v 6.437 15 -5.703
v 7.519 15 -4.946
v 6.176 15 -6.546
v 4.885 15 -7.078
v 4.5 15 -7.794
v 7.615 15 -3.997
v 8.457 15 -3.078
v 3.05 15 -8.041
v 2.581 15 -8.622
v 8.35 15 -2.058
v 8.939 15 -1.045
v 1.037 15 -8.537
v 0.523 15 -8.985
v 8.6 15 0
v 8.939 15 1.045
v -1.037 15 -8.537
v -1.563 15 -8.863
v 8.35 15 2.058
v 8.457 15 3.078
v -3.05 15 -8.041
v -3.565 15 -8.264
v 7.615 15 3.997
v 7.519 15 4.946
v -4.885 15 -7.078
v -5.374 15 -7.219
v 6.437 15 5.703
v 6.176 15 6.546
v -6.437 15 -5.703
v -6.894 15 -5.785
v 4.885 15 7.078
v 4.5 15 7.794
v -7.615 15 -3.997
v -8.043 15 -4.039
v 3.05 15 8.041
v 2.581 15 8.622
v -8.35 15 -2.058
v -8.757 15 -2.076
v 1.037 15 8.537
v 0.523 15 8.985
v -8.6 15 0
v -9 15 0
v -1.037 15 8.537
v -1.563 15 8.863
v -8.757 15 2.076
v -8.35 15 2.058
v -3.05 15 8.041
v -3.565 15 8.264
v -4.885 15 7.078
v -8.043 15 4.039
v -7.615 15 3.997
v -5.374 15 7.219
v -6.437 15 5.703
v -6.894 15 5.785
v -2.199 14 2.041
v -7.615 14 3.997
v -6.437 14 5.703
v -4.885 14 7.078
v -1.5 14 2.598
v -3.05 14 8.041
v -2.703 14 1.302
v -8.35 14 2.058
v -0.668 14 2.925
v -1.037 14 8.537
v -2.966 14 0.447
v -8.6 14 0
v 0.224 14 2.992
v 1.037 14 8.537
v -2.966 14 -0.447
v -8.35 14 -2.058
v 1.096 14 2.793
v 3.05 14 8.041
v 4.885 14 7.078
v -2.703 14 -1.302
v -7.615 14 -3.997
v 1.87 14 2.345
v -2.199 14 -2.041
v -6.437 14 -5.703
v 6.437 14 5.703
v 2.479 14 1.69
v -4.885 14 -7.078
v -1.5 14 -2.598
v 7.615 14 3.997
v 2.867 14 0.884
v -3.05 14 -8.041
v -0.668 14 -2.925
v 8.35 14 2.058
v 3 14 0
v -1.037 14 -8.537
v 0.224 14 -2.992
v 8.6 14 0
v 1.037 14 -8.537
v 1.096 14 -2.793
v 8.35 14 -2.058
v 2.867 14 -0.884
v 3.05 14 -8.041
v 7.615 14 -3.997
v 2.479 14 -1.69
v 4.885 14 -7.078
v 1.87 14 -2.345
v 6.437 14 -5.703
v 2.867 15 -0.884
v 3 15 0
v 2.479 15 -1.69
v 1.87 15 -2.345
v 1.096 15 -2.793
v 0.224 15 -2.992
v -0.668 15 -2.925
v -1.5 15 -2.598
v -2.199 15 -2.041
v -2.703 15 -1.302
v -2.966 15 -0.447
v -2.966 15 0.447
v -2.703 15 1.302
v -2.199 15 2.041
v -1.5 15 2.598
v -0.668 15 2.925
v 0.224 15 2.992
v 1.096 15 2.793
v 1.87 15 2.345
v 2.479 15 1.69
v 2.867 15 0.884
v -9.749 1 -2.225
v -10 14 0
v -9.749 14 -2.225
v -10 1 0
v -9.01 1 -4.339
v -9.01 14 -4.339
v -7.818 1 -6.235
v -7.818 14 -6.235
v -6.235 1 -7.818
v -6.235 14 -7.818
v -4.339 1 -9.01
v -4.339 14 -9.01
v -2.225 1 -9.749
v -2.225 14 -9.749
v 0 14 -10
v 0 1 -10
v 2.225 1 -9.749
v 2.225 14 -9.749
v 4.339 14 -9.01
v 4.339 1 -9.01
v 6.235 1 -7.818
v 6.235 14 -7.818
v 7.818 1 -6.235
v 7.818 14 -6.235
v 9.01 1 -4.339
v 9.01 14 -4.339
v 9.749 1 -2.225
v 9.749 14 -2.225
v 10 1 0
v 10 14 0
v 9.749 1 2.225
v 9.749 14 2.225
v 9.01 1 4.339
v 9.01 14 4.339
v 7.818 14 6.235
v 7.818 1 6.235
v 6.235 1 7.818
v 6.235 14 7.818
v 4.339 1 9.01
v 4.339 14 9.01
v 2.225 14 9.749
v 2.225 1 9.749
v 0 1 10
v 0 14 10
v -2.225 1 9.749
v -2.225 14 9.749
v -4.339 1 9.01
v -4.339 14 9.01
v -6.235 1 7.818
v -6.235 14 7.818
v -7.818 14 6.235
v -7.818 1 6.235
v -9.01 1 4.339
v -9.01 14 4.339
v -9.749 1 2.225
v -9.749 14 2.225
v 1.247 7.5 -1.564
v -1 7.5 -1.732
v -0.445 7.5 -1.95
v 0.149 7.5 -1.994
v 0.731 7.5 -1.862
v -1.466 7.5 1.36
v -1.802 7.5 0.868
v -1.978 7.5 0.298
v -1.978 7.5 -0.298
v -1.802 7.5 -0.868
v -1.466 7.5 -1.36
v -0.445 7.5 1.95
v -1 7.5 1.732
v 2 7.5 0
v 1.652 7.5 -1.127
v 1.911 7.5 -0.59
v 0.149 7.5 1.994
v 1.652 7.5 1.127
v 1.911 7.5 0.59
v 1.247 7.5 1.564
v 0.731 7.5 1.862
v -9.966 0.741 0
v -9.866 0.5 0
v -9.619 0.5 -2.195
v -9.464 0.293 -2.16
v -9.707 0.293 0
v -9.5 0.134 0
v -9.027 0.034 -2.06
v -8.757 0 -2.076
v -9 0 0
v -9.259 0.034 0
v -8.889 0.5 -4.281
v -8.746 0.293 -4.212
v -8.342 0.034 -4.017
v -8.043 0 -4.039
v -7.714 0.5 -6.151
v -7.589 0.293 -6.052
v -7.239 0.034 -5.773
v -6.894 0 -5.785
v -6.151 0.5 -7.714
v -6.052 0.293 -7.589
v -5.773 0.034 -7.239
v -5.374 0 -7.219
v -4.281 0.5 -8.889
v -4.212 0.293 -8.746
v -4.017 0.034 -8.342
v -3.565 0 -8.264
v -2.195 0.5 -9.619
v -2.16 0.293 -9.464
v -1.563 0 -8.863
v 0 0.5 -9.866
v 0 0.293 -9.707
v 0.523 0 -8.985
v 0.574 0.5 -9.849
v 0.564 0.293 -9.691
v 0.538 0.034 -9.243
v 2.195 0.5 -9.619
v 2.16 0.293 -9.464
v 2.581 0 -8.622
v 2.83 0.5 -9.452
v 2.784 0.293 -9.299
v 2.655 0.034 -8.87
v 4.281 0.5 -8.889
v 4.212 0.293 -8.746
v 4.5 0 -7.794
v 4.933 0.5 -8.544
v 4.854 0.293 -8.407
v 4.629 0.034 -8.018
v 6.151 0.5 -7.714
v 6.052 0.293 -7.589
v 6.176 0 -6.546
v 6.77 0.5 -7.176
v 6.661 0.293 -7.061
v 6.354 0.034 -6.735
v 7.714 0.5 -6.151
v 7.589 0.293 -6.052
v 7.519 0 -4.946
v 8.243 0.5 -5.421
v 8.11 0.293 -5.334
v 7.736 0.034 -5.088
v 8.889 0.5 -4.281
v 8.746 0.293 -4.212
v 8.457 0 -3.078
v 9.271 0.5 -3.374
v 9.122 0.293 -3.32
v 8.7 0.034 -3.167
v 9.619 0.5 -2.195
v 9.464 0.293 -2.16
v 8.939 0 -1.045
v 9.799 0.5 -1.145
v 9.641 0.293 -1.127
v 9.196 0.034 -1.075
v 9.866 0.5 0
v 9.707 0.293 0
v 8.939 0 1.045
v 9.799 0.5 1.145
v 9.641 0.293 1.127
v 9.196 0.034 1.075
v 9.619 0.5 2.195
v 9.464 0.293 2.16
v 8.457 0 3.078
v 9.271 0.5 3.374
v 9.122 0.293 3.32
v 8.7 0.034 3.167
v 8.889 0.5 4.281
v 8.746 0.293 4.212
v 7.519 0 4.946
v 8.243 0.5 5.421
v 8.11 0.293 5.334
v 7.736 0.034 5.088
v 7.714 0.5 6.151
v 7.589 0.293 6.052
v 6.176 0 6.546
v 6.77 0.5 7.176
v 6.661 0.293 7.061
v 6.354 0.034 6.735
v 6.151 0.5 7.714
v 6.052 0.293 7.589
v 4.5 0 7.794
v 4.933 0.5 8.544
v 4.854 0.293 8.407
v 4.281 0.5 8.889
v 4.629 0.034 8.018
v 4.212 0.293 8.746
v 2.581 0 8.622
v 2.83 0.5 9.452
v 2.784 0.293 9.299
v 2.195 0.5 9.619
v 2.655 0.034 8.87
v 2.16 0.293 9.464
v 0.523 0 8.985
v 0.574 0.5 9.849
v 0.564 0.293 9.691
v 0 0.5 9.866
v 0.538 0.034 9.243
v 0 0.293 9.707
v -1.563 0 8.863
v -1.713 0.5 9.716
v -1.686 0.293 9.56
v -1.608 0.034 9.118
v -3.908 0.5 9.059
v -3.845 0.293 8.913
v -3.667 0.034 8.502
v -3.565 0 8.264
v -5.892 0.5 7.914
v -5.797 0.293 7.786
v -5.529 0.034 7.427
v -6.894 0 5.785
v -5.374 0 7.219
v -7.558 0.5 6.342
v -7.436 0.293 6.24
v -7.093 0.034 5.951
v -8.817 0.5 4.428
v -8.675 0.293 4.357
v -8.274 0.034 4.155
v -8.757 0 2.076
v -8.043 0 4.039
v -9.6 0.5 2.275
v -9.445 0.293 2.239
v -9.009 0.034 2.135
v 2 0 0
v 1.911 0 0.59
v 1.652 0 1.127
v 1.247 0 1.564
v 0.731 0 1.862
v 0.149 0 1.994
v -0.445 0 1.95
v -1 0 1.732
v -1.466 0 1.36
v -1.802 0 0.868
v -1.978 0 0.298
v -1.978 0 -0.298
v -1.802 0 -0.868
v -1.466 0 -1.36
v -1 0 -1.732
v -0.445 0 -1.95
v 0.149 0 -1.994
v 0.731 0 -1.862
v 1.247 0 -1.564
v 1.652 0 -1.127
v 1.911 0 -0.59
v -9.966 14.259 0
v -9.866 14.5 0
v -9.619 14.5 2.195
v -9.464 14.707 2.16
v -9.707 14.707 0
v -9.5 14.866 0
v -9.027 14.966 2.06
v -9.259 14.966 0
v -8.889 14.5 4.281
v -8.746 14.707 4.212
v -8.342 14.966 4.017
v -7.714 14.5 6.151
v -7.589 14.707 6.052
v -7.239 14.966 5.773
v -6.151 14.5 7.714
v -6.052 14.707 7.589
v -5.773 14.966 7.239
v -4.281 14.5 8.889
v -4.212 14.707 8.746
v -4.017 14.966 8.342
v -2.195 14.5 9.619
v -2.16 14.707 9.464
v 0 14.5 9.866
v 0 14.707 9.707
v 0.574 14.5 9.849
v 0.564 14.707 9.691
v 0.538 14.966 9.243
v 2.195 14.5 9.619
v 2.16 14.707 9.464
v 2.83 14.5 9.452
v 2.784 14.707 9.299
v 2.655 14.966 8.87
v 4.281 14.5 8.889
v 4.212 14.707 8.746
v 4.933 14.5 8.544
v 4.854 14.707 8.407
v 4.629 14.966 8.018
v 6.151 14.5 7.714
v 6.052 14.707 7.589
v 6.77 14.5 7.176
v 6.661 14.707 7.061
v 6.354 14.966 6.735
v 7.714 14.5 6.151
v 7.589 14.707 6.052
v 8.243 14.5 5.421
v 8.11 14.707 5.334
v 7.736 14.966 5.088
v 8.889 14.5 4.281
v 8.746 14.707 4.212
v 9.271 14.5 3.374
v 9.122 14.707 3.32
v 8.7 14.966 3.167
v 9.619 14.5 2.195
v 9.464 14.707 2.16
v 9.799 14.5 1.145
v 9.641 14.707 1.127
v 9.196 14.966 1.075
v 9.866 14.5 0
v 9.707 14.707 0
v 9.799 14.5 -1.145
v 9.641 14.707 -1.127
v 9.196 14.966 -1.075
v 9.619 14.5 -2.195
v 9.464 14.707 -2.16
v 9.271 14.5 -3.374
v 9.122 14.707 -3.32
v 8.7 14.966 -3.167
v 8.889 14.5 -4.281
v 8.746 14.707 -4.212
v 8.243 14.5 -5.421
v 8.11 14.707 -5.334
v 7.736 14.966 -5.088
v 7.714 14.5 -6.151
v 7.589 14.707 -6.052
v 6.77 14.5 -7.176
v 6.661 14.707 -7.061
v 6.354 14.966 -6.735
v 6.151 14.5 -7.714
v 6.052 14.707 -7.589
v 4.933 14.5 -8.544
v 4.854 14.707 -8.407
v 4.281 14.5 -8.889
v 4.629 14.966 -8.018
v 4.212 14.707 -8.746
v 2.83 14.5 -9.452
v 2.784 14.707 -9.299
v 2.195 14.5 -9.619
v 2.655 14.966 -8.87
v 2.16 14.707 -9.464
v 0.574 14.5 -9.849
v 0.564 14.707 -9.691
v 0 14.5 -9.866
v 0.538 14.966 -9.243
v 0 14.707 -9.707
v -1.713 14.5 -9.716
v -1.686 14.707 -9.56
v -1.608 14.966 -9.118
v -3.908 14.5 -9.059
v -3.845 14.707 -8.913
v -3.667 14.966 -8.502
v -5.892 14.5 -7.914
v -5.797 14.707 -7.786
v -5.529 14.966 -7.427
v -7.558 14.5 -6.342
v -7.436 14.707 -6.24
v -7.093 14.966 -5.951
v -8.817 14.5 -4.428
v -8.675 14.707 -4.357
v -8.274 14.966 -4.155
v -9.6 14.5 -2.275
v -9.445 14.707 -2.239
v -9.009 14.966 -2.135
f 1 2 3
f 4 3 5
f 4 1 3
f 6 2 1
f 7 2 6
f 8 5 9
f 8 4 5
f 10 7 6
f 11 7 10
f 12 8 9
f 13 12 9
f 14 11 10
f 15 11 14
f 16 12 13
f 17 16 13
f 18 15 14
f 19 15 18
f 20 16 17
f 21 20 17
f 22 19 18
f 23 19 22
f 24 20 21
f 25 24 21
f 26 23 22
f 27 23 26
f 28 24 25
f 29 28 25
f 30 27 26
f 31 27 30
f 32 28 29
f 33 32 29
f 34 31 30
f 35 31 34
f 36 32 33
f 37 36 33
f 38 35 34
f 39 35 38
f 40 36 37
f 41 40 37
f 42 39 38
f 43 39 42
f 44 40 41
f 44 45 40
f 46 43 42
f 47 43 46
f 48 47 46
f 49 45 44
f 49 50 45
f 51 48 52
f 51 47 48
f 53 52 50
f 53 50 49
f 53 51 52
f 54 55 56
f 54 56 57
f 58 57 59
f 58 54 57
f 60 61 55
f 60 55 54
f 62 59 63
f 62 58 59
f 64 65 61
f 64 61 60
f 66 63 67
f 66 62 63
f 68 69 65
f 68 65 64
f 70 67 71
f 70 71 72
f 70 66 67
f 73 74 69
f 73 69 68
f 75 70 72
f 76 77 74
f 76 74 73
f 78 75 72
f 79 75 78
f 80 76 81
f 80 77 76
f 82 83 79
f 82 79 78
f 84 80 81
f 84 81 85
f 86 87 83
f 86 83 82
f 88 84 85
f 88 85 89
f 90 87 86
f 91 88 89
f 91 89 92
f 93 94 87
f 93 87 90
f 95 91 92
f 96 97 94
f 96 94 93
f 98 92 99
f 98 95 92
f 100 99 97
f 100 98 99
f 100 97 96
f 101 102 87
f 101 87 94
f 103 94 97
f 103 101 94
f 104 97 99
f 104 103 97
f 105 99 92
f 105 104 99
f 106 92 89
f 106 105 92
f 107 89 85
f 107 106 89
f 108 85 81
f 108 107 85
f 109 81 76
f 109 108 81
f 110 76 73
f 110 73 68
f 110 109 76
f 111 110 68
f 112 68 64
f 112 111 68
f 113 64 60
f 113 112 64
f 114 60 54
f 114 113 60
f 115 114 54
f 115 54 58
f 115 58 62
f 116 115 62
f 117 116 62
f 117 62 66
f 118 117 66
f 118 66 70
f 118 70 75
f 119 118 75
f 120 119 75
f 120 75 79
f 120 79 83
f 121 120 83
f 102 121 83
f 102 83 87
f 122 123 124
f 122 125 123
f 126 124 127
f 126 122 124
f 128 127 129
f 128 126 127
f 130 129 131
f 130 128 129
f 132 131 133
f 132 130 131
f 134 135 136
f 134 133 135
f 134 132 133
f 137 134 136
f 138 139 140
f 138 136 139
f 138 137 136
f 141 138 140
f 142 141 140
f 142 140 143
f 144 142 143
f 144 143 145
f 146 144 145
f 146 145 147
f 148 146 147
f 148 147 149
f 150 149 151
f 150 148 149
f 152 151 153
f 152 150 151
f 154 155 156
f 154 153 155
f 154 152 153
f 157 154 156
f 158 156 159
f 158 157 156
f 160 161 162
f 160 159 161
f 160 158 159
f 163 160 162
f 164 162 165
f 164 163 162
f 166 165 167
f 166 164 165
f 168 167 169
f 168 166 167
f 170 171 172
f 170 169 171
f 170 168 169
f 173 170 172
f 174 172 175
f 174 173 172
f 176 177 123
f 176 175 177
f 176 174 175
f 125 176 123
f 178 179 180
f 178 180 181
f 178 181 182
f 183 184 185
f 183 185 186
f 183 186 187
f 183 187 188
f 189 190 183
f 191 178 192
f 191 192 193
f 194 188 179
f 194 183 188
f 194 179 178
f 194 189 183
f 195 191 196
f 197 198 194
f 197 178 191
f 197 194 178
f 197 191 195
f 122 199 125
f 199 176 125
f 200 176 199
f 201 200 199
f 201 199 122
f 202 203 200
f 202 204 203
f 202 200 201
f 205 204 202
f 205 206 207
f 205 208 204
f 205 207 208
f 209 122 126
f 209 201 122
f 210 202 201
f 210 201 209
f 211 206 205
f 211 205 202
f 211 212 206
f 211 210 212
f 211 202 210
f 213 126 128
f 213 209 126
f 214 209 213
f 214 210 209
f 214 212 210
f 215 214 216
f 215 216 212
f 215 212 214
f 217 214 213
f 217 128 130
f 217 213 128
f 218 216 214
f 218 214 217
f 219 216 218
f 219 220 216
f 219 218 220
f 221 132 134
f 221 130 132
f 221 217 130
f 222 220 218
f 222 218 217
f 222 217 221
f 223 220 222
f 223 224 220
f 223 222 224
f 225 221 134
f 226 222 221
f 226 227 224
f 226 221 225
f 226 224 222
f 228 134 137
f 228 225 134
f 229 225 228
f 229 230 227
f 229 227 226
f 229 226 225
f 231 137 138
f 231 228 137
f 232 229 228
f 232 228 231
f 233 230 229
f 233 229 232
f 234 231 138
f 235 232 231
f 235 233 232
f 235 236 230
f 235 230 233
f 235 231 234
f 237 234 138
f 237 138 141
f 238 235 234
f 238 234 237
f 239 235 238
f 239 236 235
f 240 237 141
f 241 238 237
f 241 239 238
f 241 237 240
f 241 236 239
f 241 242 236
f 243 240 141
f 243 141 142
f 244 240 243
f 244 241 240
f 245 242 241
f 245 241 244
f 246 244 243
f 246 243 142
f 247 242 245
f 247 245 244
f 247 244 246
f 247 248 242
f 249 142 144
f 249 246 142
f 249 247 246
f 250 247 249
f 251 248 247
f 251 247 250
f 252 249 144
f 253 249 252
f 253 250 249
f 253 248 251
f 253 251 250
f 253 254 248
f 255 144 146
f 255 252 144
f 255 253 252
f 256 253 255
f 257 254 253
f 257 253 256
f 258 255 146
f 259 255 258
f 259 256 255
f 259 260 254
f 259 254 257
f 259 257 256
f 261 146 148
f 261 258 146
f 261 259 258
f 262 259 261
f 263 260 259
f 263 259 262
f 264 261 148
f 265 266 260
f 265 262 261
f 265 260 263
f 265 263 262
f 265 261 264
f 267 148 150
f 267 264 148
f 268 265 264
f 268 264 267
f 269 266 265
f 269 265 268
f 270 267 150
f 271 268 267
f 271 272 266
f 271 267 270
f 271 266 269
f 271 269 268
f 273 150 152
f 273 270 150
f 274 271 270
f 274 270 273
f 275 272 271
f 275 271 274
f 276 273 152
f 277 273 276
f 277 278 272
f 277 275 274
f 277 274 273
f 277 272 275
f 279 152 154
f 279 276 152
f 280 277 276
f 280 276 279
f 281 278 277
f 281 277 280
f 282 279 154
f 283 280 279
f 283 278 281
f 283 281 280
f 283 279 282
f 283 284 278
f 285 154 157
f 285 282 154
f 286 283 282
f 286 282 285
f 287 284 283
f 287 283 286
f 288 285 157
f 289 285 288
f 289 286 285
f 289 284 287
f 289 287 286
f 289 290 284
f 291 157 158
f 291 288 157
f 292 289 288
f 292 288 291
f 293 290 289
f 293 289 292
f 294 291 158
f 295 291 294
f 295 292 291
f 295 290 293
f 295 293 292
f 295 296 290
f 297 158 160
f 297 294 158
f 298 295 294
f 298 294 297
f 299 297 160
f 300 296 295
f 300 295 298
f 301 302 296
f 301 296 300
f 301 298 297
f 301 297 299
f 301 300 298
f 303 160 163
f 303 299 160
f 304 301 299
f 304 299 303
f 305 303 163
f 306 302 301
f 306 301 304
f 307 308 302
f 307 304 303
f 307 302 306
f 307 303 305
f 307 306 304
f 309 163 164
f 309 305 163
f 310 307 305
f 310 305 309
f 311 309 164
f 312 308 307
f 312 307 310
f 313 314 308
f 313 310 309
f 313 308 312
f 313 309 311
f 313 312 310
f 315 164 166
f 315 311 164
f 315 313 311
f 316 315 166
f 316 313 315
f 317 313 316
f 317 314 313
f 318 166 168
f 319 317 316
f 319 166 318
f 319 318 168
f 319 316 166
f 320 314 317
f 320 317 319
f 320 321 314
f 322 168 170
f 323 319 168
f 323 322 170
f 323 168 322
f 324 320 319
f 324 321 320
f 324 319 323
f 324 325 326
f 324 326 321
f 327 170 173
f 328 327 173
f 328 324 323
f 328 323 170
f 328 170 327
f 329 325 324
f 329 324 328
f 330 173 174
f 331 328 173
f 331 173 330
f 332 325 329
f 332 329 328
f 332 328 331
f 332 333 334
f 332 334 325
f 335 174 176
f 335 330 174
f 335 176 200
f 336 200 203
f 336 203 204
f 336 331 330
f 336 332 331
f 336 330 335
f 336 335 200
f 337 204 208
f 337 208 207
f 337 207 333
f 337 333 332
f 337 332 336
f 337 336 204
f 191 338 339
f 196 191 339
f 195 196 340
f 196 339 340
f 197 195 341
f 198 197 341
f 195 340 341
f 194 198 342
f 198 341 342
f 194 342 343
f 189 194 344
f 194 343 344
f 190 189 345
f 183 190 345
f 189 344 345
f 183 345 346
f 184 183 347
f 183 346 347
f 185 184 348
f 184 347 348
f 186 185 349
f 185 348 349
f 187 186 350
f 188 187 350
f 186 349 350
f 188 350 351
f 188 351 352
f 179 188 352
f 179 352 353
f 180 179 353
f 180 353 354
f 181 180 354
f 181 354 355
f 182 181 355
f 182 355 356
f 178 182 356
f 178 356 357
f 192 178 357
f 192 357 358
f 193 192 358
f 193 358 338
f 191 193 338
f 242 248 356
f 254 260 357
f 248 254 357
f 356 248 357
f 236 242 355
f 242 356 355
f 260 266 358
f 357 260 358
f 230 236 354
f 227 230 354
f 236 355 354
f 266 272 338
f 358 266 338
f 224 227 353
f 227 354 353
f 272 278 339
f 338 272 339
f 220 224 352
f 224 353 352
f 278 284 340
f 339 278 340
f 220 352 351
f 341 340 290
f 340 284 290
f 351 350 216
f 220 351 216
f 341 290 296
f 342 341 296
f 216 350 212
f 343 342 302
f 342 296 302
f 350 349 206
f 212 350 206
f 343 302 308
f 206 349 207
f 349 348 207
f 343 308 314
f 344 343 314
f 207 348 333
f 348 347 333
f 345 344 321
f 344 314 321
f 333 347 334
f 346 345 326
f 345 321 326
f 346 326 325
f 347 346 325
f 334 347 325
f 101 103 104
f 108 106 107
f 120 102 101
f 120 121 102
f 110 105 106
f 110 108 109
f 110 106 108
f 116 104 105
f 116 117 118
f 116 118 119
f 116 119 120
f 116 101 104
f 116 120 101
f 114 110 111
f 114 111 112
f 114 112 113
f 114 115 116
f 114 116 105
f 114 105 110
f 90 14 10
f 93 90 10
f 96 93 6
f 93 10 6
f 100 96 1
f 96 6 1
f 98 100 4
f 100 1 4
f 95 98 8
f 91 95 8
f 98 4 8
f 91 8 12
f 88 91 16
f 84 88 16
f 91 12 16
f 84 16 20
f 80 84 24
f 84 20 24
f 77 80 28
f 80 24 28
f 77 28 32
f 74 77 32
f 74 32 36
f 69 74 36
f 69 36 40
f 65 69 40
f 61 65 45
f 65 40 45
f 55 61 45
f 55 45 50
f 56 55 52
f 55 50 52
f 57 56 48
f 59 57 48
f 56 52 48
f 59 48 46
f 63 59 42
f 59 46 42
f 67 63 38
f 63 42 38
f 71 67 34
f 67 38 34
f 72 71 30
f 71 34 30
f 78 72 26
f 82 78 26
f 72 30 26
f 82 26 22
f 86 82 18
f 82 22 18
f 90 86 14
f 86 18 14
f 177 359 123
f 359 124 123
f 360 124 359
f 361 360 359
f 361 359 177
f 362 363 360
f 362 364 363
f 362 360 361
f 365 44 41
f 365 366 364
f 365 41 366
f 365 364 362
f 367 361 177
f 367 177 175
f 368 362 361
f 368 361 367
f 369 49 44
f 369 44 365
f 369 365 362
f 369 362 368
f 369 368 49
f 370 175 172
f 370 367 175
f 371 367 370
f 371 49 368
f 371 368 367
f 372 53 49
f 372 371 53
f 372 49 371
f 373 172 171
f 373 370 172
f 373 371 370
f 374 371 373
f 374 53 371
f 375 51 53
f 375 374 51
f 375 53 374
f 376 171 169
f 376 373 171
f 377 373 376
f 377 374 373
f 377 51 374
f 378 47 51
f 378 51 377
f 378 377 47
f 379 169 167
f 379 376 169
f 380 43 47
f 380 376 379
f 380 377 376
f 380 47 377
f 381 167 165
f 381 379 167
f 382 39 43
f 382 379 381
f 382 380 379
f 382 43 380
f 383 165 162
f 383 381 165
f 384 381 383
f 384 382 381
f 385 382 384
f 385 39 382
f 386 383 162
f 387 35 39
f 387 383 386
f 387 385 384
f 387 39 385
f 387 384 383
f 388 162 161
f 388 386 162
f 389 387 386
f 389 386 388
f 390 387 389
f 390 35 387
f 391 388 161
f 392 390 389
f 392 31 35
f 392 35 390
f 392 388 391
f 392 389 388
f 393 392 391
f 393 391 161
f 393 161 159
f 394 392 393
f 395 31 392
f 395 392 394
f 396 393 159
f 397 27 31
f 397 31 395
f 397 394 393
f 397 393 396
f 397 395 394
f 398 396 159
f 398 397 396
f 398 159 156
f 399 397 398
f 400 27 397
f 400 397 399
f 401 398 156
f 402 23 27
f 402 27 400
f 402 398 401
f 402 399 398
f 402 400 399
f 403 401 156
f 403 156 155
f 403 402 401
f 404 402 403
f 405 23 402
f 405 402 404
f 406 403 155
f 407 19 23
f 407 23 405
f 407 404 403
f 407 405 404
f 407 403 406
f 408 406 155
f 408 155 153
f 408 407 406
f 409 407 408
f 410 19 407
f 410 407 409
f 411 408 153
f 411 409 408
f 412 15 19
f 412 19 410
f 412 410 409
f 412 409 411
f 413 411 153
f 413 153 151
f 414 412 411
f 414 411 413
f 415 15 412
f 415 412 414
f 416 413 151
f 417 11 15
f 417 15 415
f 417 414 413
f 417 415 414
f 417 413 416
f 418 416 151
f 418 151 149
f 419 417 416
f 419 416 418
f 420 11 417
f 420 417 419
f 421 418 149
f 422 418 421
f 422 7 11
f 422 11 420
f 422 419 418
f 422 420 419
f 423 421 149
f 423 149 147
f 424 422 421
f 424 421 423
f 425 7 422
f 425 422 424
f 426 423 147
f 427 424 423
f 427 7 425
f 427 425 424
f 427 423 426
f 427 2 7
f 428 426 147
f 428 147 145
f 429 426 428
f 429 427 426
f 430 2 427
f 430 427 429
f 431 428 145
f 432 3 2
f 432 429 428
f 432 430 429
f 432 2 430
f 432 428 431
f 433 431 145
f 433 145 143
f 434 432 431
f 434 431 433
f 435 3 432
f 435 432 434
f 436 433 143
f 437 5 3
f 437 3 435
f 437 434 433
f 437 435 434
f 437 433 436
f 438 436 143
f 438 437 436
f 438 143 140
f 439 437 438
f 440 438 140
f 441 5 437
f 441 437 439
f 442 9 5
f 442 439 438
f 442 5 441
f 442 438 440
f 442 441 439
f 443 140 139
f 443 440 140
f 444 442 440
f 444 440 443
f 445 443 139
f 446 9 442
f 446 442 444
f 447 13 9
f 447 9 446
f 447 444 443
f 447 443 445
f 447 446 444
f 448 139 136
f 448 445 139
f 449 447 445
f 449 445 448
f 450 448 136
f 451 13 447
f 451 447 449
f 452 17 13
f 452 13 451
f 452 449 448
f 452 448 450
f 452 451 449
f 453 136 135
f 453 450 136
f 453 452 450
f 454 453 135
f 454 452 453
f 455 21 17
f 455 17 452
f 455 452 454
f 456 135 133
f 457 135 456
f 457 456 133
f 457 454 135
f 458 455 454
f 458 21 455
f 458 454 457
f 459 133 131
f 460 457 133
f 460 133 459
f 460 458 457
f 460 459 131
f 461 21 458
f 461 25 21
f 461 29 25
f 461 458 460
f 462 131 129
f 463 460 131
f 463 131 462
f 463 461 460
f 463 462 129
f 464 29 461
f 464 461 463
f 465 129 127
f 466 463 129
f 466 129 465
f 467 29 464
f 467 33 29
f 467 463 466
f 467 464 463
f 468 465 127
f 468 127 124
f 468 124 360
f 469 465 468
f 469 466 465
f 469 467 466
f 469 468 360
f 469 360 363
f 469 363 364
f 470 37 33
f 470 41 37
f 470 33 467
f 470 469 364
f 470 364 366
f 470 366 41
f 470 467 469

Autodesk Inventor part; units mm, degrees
ref_plane "YZ Plane" through (0, 0, 0) normal (1, 0, 0) x (0, 1, 0)
ref_plane "XZ Plane" through (0, 0, 0) normal (0, 1, 0) x (-1, 0, 0)
ref_plane "XY Plane" through (0, 0, 0) normal (0, 0, 1) x (1, 0, 0)
sketch "Boceto1" plane through (0, 0, 0) normal (0, 1, 0) x (-1, 0, 0)
  circle A0 centre (0, 0) radius 10
  dimension "d0" = 20
extrude "Extrusión1" add sketch "Boceto1" along normal blind 15
sketch "Boceto2" plane through (0, 15, 0) normal (0, 1, 0) x (1, 0, 0)
  circle A0 centre (0, 0) radius 3
  circle A1 centre (0, 0) radius 8.6
  circle A2 centre (0, 0) radius 10 projected
  dimension "d3" = 1.4
  dimension "d4" = 6
extrude "Extrusión2" cut sketch "Boceto2" against normal blind 1 contours A1
sketch "Boceto3" plane through (0, 0, 0) normal (0, -1, 0) x (1, 0, 0)
  circle A0 centre (0, 0) radius 2
  dimension "d7" = 4
extrude "Extrusión3" cut sketch "Boceto3" against normal blind 7.5
fillet "Empalme1" radius 1 2 edges at (10, 0, 0) (10, 15, 0)
properties part number "electromagnet"
